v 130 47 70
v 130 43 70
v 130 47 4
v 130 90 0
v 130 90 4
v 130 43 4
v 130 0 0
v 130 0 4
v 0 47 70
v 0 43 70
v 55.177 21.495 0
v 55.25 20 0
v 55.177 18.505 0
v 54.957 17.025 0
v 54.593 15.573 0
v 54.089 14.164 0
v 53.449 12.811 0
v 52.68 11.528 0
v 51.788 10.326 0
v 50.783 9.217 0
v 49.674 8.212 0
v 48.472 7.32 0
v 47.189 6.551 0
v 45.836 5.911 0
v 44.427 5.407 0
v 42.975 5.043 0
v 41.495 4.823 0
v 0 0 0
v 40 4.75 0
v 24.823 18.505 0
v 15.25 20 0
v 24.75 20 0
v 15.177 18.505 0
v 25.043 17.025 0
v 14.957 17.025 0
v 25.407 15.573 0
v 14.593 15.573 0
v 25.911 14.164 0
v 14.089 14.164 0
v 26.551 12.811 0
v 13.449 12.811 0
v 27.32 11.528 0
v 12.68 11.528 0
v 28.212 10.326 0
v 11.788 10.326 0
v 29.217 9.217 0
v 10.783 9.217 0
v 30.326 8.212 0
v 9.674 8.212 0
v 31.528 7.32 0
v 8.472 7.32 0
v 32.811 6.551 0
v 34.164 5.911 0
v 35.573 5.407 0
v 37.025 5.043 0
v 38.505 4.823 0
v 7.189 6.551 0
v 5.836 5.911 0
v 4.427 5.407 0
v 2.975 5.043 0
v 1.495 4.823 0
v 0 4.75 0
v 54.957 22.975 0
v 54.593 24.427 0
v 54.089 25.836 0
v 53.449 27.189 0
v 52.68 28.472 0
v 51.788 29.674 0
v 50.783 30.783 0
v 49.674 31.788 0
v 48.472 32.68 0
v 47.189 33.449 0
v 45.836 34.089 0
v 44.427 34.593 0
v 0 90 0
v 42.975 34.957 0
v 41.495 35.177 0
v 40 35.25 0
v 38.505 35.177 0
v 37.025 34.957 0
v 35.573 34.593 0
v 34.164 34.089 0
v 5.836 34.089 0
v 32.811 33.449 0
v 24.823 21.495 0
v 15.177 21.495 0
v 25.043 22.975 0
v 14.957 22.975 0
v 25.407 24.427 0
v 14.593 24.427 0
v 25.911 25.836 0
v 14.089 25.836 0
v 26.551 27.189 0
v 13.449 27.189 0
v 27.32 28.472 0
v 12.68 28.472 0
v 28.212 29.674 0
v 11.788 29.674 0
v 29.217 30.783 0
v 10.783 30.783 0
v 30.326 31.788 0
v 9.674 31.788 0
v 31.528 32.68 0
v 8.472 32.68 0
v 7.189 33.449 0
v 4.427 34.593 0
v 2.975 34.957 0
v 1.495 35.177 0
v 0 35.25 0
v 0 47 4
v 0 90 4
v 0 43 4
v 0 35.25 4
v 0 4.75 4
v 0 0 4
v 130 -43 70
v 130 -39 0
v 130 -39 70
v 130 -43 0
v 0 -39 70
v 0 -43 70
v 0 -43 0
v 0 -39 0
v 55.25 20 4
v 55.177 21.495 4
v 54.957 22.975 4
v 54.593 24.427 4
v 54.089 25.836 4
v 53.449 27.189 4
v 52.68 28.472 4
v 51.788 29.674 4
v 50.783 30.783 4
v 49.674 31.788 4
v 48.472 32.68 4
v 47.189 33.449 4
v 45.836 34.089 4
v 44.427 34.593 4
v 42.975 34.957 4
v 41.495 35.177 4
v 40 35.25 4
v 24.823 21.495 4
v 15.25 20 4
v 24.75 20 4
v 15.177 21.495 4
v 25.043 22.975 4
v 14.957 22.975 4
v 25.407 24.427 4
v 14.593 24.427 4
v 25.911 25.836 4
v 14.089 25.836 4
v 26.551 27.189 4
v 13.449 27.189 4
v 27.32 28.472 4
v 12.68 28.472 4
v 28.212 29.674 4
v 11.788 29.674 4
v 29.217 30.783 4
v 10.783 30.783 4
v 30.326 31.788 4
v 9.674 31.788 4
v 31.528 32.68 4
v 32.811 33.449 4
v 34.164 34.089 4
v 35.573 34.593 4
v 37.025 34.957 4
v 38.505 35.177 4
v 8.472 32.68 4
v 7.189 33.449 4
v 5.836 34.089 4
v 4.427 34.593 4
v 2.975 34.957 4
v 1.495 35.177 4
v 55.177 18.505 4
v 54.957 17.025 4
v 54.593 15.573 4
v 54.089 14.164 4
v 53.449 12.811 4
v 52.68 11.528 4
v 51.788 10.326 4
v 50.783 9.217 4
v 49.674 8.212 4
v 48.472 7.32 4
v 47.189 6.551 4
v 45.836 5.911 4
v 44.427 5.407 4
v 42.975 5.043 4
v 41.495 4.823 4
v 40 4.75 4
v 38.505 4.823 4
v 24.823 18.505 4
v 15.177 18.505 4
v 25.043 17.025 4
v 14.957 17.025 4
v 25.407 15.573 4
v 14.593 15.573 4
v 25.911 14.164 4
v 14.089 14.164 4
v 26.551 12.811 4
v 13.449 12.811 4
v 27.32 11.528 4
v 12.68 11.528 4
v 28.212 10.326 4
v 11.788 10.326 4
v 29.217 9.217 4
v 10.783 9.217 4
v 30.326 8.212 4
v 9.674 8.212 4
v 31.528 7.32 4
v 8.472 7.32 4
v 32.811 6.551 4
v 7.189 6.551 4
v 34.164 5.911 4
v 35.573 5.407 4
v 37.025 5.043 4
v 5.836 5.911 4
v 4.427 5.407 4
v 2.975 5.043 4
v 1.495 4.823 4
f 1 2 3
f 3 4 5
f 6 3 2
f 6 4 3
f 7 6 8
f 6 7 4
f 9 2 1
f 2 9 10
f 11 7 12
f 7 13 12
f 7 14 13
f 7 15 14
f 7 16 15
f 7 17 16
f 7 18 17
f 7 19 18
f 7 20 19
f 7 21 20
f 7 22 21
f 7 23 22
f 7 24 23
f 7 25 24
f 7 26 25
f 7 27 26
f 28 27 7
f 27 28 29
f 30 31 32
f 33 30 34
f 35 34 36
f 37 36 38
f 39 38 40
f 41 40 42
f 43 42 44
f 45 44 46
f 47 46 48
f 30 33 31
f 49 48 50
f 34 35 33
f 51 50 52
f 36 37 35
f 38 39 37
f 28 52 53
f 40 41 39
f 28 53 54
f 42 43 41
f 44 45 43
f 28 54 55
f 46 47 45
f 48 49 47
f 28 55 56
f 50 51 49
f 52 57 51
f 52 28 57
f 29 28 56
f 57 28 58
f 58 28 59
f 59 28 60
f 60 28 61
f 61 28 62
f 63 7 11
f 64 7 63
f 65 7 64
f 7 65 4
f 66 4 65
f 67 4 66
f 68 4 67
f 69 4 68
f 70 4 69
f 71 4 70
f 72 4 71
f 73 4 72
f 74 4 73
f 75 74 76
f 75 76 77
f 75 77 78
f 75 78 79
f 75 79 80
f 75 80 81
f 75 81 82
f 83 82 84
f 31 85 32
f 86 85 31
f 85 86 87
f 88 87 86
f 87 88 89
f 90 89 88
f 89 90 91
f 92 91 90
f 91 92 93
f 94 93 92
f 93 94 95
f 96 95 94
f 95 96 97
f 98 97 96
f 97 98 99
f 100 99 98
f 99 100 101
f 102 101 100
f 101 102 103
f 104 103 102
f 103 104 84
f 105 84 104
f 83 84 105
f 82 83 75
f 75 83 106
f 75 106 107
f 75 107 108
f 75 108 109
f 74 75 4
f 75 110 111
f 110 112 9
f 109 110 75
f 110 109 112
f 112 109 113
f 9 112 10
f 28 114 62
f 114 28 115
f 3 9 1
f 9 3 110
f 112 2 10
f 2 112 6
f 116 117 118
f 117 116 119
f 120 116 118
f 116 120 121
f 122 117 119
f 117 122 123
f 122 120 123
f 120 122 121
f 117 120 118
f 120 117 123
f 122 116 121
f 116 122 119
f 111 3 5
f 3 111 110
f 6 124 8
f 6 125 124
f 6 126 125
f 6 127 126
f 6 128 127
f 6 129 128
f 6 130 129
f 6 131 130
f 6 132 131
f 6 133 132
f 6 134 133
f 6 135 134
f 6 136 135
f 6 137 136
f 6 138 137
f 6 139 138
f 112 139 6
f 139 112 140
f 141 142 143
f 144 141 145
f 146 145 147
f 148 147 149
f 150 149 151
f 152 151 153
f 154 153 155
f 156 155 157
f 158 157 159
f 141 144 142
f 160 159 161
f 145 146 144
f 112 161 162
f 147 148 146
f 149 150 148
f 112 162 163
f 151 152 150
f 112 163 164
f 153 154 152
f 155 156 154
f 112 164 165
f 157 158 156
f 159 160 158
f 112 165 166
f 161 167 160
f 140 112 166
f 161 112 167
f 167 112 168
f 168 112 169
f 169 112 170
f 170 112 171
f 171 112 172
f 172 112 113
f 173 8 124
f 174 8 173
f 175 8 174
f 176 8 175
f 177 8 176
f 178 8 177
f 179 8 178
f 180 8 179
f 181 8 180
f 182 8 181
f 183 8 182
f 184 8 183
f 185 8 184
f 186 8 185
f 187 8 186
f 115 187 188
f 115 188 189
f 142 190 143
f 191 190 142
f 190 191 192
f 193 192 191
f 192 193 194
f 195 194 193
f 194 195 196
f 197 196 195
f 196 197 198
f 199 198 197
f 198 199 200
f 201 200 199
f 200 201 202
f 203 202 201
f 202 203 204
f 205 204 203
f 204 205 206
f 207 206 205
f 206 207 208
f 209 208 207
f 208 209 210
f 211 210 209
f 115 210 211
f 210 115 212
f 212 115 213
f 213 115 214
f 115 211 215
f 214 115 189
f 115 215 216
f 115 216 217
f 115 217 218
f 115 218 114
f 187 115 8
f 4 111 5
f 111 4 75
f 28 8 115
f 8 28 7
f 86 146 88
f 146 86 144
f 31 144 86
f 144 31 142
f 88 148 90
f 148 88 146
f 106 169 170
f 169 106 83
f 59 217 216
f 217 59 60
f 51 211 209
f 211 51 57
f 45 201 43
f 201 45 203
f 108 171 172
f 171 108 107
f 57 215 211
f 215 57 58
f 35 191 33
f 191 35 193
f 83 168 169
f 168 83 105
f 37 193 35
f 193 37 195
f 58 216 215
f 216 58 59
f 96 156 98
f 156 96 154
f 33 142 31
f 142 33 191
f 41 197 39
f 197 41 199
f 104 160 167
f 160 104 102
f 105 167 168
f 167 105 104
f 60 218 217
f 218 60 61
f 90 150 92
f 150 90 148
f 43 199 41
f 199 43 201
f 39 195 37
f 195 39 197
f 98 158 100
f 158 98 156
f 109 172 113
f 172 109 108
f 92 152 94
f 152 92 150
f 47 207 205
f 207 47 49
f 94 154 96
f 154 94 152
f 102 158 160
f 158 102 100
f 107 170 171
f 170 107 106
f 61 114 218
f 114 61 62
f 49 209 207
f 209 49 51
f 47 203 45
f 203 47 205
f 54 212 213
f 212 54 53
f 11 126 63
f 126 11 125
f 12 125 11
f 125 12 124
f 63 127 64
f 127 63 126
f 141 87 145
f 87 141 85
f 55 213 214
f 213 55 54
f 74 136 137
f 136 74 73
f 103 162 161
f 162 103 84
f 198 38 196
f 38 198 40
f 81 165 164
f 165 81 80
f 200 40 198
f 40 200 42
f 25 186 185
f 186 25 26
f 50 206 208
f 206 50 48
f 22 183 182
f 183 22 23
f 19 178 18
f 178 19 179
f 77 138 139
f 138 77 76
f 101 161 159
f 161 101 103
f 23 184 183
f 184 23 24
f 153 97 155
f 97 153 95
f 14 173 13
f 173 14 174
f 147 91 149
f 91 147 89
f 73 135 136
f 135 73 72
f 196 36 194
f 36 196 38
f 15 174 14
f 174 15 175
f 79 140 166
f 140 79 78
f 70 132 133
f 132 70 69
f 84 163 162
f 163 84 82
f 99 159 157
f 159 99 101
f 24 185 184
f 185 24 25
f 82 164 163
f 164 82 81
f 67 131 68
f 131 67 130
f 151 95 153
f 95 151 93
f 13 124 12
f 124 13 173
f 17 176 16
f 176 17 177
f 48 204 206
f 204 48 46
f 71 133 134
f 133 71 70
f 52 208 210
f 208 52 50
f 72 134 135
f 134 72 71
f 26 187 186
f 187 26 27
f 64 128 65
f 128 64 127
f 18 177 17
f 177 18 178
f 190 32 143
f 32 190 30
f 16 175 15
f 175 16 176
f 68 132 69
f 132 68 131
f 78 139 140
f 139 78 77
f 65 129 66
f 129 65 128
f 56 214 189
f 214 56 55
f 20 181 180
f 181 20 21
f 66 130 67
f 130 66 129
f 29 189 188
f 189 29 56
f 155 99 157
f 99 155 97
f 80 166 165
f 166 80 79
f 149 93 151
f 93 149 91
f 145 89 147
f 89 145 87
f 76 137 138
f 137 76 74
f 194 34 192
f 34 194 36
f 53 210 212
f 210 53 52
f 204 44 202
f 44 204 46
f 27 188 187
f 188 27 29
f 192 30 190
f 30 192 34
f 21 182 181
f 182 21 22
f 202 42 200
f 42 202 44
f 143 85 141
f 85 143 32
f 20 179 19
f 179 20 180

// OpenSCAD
// --- Dimensions in mm ---

plate_length_X = 130;      // Total length along X axis of the base plate
plate_width_Y = 90;        // Total width along Y axis of the base plate
plate_thickness = 4;       // Thickness of the base plate (Z dimension)
tube_hole_diameter = 30.5; // Diameter of the holes for Falcon tubes
tube_hole_radius = tube_hole_diameter / 2;

wall_height = 70;          // Height the side walls rise to from the base plate
wall_thickness_Y = 4;     // Thickness of the long side walls (in Y direction)

spacing_X = 40;            // Center-to-center spacing between holes along X
spacing_Y = 40;            // Center-to-center spacing between holes along Y

// --- Global Settings ---
$fn = 64; // High resolution for curves

// --- Calculations ---

// Plate is centered at (0, 0). X runs from -65 to 65. Y runs from -45 to 45.

// X positions: 3 tubes along X (indices 1, 2, 3)
x_positions = [
    -spacing_X, // Center of the first tube group relative to center line
     0,          // Center of the second tube group
     spacing_X  // Center of the third tube group
];

// Y positions: 2 rows along Y (indices 1, 2)
y_positions = [
    -spacing_Y / 2, // Row 1 center
     spacing_Y / 2  // Row 2 center
];


// --- Module Definitions ---

// Creates the main base plate structure
module base_plate() {
    cube([plate_length_X, plate_width_Y, plate_thickness]);
}

// Creates one through-hole centered at (x, y)
module tube_hole(x_center, y_center) {
    // Extend slightly past the top and bottom of the base plate for clean cutting
    translate([x_center, y_center, -0.1]) 
    cylinder(h = plate_thickness + 0.2, r = tube_hole_radius);
}

// Creates the two long side walls rising from the base plate
module side_wall() {
    // The wall is 130mm (X) long and 4mm thick (Y). It rises to Z=70.
    // Long edges are at Y = +/- (plate_width_Y / 2).
    // Wall thickness is in Y direction, so it occupies a slice of width 4mm centered on the edge line.

    // Wall 1 (Positive Y side) - Centered at Y = plate_width_Y/2
    translate([0, plate_width_Y/2 - wall_thickness_Y/2, 0]) {
        cube([plate_length_X, wall_thickness_Y, wall_height]);
    }

    // Wall 2 (Negative Y side) - Centered at Y = -plate_width_Y/2
    translate([0, -plate_width_Y/2 + wall_thickness_Y/2, 0]) {
        cube([plate_length_X, wall_thickness_Y, wall_height]);
    }
}


// --- Assembly ---

difference() {
    // 1. Base Plate (The main body) and Side Walls combined
    union() {
        base_plate();

        // 2. Side Walls (These extend up from the plate)
        side_wall();
    }

    // 3. Cutouts: Holes for tubes and material removal through walls

    // A. Tube Holes (6 holes in the base plate)
    for (i = [0 : len(x_positions)-1]) {
        for (j = [0 : len(y_positions)-1]) {
            translate([x_positions[i], y_positions[j], 0]) {
                tube_hole(0, 0); // The tube_hole module is designed to be translated externally
            }
        }
    }

    // B. Cutting through the side walls (to ensure tubes pass through)
    for (i = [0 : len(x_positions)-1]) {
        for (j = [0 : len(y_positions)-1]) {

            // Hole centered at X=x_positions[i], Y=y_positions[j]
            // Cut deep enough to pass through the entire structure (plate + walls)
            translate([x_positions[i], y_positions[j], -0.1]) {
                cylinder(h = wall_height + plate_thickness + 2, r = tube_hole_radius);
            }
        }
    }

}
